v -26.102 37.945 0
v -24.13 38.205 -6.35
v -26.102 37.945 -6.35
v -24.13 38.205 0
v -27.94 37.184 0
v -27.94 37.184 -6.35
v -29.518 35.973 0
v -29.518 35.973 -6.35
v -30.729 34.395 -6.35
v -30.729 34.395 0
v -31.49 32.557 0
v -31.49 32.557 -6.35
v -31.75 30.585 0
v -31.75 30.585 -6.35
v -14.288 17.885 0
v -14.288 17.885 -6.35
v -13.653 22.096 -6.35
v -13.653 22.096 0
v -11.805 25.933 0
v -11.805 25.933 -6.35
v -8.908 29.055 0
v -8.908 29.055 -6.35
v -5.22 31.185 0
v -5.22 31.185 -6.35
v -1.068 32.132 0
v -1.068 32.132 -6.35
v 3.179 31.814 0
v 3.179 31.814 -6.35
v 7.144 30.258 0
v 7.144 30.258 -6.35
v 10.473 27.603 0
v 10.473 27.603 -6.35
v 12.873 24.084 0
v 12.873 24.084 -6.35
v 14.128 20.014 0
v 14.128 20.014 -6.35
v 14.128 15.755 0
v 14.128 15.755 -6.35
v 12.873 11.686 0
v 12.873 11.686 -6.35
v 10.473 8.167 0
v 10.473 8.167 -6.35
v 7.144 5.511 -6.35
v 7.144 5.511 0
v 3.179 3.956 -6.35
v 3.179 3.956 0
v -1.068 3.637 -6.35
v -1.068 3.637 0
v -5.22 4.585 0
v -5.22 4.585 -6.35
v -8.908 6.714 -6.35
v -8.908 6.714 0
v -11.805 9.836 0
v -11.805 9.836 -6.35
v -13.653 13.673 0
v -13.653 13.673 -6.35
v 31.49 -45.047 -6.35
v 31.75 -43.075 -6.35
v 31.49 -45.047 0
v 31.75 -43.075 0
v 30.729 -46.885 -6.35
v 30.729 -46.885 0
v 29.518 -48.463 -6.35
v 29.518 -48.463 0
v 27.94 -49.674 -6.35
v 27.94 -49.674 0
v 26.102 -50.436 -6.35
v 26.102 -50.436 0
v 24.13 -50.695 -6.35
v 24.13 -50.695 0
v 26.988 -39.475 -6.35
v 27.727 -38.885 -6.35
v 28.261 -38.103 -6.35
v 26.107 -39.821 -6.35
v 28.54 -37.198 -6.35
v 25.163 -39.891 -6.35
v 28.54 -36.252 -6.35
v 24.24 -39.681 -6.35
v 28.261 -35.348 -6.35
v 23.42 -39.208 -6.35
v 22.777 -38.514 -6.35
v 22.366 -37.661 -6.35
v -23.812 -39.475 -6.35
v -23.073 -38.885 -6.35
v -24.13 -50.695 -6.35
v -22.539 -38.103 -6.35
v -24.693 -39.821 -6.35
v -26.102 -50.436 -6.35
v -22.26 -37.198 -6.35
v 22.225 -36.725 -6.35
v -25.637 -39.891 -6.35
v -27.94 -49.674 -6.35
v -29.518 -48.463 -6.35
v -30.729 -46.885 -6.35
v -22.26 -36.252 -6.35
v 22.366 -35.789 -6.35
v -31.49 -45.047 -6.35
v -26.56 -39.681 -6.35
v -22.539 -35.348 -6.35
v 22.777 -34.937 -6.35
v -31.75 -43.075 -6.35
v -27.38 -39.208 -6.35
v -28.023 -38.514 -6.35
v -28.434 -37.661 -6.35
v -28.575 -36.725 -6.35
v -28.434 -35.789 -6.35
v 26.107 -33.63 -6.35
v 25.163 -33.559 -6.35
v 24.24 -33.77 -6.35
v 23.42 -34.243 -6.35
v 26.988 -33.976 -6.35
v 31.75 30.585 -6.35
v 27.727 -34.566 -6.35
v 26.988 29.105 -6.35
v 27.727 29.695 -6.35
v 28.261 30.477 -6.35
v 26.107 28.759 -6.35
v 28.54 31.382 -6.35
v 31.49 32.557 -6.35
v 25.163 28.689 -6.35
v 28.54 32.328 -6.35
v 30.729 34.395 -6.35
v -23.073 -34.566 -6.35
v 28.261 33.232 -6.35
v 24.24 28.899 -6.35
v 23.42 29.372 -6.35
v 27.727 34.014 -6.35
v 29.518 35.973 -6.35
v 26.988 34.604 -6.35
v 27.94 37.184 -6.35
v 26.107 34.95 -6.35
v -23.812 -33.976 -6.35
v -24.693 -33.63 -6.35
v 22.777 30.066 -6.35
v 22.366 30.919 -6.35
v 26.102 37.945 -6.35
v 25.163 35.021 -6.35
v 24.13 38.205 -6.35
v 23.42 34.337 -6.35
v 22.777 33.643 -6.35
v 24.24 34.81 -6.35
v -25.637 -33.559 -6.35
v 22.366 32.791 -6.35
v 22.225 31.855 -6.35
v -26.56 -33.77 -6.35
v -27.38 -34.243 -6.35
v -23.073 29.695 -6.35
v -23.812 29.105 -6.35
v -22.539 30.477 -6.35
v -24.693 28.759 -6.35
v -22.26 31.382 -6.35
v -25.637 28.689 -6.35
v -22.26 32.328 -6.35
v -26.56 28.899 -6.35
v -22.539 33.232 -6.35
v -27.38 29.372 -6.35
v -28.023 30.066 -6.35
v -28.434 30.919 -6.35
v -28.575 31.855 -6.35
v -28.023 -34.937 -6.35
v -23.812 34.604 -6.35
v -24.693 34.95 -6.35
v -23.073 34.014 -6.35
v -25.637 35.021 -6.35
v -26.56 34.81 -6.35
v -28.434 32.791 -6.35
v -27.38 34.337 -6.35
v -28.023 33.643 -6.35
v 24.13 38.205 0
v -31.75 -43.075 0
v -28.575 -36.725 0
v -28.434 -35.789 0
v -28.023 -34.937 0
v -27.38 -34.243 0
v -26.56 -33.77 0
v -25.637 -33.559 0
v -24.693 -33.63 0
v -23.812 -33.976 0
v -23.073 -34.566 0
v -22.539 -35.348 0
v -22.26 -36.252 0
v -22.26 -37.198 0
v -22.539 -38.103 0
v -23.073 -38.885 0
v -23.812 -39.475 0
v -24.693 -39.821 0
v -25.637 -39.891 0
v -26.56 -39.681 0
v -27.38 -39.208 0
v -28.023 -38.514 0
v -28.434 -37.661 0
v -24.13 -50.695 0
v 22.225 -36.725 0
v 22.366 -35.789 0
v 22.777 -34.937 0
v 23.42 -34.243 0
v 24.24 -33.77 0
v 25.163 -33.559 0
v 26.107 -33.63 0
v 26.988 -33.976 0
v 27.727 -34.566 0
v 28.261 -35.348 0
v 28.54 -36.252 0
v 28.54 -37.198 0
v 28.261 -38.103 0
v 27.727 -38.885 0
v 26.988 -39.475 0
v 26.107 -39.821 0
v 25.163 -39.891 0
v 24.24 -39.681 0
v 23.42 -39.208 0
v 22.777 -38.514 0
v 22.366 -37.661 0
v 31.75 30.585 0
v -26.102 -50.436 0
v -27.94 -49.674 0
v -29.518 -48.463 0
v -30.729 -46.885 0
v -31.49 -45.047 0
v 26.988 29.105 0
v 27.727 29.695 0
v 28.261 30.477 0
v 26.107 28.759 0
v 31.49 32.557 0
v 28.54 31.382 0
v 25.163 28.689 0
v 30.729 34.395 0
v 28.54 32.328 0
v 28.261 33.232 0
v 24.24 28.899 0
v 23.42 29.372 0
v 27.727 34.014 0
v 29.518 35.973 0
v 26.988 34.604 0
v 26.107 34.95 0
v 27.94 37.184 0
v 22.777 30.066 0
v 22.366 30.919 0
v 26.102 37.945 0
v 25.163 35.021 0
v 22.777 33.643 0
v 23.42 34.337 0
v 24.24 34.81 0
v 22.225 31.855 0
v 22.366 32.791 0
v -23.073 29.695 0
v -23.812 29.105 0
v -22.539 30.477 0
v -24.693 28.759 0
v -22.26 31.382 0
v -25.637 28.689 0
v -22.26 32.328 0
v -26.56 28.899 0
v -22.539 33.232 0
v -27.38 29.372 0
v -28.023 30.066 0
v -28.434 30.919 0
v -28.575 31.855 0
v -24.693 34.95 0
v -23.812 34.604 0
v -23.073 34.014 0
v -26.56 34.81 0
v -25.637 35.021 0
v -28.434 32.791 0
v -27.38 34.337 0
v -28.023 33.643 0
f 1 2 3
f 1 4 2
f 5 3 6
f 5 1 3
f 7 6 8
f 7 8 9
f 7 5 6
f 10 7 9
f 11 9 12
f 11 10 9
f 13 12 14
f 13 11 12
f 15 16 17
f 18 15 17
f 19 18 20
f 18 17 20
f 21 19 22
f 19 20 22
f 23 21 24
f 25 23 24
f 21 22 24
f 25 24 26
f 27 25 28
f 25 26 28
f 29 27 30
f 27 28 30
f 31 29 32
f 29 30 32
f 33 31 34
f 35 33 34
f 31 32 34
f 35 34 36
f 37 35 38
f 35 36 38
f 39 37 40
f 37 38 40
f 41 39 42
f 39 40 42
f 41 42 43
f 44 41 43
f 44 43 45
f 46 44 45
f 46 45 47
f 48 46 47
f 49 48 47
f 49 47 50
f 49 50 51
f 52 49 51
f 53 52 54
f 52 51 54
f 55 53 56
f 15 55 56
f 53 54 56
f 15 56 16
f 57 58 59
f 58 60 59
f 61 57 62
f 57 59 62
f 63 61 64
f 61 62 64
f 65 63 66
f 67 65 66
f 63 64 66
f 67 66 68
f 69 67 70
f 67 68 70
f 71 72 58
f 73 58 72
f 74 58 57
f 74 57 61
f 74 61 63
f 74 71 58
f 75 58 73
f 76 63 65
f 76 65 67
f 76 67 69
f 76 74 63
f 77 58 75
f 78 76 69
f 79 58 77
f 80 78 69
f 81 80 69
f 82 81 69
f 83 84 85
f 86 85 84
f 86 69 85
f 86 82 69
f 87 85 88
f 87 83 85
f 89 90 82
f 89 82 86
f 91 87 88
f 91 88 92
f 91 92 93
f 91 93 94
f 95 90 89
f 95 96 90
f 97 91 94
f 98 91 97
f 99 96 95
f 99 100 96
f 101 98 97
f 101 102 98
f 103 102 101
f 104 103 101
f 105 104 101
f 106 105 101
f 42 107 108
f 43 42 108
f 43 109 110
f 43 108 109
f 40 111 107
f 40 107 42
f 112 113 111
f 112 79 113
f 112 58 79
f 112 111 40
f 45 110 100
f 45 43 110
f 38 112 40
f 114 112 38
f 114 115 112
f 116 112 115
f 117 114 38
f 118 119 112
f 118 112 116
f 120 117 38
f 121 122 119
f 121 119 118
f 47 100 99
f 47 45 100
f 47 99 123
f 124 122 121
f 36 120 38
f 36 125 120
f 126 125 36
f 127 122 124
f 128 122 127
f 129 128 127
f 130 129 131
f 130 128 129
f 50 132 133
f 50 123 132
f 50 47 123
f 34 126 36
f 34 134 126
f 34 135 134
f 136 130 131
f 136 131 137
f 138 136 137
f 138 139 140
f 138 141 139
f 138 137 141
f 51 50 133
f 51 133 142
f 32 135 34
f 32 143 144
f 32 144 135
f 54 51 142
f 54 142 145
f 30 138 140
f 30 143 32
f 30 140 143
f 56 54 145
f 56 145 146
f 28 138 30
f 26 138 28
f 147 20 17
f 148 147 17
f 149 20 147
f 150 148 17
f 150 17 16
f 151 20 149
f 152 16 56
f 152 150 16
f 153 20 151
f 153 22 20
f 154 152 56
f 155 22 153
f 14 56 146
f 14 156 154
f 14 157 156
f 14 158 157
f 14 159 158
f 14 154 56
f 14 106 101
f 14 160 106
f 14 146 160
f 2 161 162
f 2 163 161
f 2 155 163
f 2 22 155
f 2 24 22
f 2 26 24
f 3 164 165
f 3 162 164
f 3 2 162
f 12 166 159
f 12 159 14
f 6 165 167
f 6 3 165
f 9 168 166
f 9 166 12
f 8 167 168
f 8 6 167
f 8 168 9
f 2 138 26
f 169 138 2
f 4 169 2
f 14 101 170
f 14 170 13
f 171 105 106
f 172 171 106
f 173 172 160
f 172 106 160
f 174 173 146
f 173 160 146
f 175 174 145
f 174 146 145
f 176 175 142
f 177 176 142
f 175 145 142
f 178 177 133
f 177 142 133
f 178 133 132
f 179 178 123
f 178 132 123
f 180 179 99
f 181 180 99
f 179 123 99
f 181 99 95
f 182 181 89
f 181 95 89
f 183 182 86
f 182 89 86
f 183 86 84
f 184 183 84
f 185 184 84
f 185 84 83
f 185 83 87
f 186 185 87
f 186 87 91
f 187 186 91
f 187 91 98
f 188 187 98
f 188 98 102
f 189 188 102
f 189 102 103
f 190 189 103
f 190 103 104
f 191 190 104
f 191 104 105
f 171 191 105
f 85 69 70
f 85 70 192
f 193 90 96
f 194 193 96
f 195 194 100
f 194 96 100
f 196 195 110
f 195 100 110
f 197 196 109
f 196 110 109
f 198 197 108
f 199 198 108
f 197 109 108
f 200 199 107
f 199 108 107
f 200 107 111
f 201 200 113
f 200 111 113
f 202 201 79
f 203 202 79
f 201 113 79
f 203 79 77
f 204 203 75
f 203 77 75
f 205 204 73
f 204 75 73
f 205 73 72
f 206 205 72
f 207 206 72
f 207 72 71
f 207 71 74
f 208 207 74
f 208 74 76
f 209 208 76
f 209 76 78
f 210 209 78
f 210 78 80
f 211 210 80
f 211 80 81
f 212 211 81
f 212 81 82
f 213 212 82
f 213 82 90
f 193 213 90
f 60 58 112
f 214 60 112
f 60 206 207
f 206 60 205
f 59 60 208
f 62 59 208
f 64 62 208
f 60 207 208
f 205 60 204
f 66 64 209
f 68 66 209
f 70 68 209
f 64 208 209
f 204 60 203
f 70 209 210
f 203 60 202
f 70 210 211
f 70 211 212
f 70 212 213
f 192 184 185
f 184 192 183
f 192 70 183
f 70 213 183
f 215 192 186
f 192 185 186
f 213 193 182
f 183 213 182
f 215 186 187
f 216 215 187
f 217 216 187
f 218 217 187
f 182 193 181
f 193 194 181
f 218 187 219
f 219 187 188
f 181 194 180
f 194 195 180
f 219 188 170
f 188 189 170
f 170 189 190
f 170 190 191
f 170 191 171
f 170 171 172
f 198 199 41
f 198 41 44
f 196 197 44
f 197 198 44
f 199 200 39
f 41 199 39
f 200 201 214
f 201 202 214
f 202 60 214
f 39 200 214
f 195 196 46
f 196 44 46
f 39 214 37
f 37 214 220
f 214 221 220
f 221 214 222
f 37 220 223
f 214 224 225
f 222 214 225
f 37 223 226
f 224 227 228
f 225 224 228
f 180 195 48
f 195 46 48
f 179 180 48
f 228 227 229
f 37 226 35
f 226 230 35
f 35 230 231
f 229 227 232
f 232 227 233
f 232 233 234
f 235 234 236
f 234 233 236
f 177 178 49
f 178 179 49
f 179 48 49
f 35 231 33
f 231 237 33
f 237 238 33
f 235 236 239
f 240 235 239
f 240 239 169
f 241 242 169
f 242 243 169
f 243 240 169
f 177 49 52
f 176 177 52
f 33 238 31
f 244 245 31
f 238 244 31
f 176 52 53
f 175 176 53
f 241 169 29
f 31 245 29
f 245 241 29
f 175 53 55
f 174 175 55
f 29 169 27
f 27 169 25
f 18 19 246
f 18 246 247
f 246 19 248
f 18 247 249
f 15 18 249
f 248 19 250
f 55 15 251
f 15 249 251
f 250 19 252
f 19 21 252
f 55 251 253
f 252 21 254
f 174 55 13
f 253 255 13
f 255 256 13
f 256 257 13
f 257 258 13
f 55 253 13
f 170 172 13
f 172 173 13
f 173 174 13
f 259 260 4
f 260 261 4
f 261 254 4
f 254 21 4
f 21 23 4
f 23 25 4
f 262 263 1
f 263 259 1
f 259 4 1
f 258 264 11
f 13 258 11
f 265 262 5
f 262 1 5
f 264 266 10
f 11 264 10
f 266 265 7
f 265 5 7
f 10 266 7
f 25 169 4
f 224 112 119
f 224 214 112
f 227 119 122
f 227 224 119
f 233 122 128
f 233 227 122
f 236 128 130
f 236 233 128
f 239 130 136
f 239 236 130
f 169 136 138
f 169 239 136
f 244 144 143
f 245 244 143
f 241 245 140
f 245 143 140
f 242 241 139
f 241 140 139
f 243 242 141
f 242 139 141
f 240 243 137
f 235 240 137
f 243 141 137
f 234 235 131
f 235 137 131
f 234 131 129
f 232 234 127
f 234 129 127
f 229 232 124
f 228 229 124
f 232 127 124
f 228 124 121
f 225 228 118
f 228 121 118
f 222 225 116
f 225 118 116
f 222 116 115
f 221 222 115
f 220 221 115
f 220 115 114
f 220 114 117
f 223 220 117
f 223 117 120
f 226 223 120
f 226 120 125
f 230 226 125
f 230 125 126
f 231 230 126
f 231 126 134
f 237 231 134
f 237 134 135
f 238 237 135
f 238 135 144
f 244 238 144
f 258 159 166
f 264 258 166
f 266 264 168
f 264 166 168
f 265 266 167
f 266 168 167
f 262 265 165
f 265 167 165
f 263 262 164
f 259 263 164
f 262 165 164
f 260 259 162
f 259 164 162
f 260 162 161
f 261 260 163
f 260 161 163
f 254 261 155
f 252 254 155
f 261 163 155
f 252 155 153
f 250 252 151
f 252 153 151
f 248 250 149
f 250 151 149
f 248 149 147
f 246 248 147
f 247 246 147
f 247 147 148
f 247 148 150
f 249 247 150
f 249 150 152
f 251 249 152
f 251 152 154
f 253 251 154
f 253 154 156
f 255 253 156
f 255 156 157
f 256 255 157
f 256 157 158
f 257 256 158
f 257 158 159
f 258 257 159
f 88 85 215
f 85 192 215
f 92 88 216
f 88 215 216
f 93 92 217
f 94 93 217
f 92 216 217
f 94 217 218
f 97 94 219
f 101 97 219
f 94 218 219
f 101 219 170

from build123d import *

# Parameters (mm, degrees)
BOSS_EXTRUDE1_DEPTH = 6.35
SKETCH2_R           = 1.35
SKETCH2_R_2         = 1.385
CUT_EXTRUDE1_DEPTH  = 38.116505762
SKETCH3_W           = 63.5
SKETCH3_H           = 88.9
SKETCH3_W_2         = 38.321076004
SKETCH3_H_2         = 47.237540142
BOSS_EXTRUDE2_DEPTH = 6.35
SKETCH5_W           = 27.94
SKETCH5_H           = 55.88
CUT_EXTRUDE3_DEPTH  = 61.153053743
SKETCH6_R           = 3.175
CUT_EXTRUDE4_DEPTH  = 61.153053743
FILLET2_R           = 7.62
SKETCH7_W           = 41.724968974
SKETCH7_H           = 57.858351452
BOSS_EXTRUDE3_DEPTH = 6.35
SKETCH8_R           = 14.2875
CUT_EXTRUDE5_DEPTH  = 6.35


with BuildPart() as part:
    # Sketch1 → Boss-Extrude1 (new body)
    with BuildSketch(Plane.XY):
        with BuildLine():
            Line((-19.69889026, 23.2987845), (-14.850045261, 29.75147823))
            ThreePointArc((-14.850045261, 29.75147823), (-14.144755454, 30.339267512), (-13.251155001, 30.55))
            Line((-13.251155001, 30.55), (13.251155001, 30.55))
            ThreePointArc((13.251155001, 30.55), (14.144755454, 30.339267512), (14.850045261, 29.75147823))
            Line((14.850045261, 29.75147823), (19.69889026, 23.2987845))
            ThreePointArc((19.69889026, 23.2987845), (19.997074131, 22.730638521), (20.1, 22.09730627))
            Line((20.1, 22.09730627), (20.1, -22.09730627))
            ThreePointArc((20.1, -22.09730627), (19.997074131, -22.730638521), (19.69889026, -23.2987845))
            Line((19.69889026, -23.2987845), (14.850045261, -29.75147823))
            ThreePointArc((14.850045261, -29.75147823), (14.144755454, -30.339267512), (13.251155001, -30.55))
            Line((13.251155001, -30.55), (-13.251155001, -30.55))
            ThreePointArc((-13.251155001, -30.55), (-14.144755454, -30.339267512), (-14.850045261, -29.75147823))
            Line((-14.850045261, -29.75147823), (-19.69889026, -23.2987845))
            ThreePointArc((-19.69889026, -23.2987845), (-19.997074131, -22.730638521), (-20.1, -22.09730627))
            Line((-20.1, -22.09730627), (-20.1, 22.09730627))
            ThreePointArc((-20.1, 22.09730627), (-19.997074131, 22.730638521), (-19.69889026, 23.2987845))
        make_face()
    extrude(amount=-BOSS_EXTRUDE1_DEPTH)

    # Sketch2 → Cut-Extrude1 (cut, through all)
    with BuildSketch(Plane(origin=(0, 0, -6.35), x_dir=(-1, 0, 0), z_dir=(0, 0, -1))):
        with Locations((17.3, 21.9487845)):
            Circle(SKETCH2_R)
        with Locations((17.3, -0.0512155)):
            Circle(SKETCH2_R)
        with Locations((17.3, -22.0512155)):
            Circle(SKETCH2_R)
        with Locations((11, -27.75)):
            Circle(SKETCH2_R_2)
        with Locations(Location((-11, -27.75, 0), (0, 0, 180))):
            Circle(SKETCH2_R_2)
        with Locations(Location((-17.3, -22.0512155, 0), (0, 0, 180))):
            Circle(SKETCH2_R)
        with Locations(Location((-17.3, -0.0512155, 0), (0, 0, 180))):
            Circle(SKETCH2_R)
        with Locations(Location((-17.3, 21.9487845, 0), (0, 0, 180))):
            Circle(SKETCH2_R)
    extrude(amount=-CUT_EXTRUDE1_DEPTH, mode=Mode.SUBTRACT)

    # Sketch3 → Boss-Extrude2 (add)
    with BuildSketch(Plane(origin=(0, 0, -6.35), x_dir=(-1, 0, 0), z_dir=(0, 0, -1))):
        with Locations((0, -6.2452155)):
            Rectangle(SKETCH3_W, SKETCH3_H)
        Rectangle(SKETCH3_W_2, SKETCH3_H_2, mode=Mode.SUBTRACT)
    extrude(amount=-BOSS_EXTRUDE2_DEPTH)

    # Sketch5 → Cut-Extrude3 (cut, through all)
    with BuildSketch(Plane.XY):
        with Locations((0, 3.0087845)):
            Rectangle(SKETCH5_W, SKETCH5_H)
    extrude(amount=-CUT_EXTRUDE3_DEPTH, mode=Mode.SUBTRACT)

    # Sketch6 → Cut-Extrude4 (cut, through all)
    with BuildSketch(Plane(origin=(0, 0, -6.35), x_dir=(-1, 0, 0), z_dir=(0, 0, -1))):
        with Locations((25.4, 31.8547845)):
            Circle(SKETCH6_R)
        with Locations((-25.4, 31.8547845)):
            Circle(SKETCH6_R)
        with Locations((-25.4, -36.7252155)):
            Circle(SKETCH6_R)
        with Locations((25.4, -36.7252155)):
            Circle(SKETCH6_R)
    extrude(amount=-CUT_EXTRUDE4_DEPTH, mode=Mode.SUBTRACT)

    # Fillet2
    fillet2_edges = [part.edges().sort_by_distance(p)[0] for p in [
        (-31.75, 38.2047845, -3.175),
        (-31.75, -50.6952155, -3.175),
        (31.75, -50.6952155, -3.175),
        (31.75, 38.2047845, -3.175),
    ]]
    fillet(fillet2_edges, radius=FILLET2_R)

    # Sketch7 → Boss-Extrude3 (add)
    with BuildSketch(Plane(origin=(0, 0, -6.35), x_dir=(-1, 0, 0), z_dir=(0, 0, -1))):
        with Locations((0, 3.16744248)):
            Rectangle(SKETCH7_W, SKETCH7_H)
    extrude(amount=-BOSS_EXTRUDE3_DEPTH)

    # Sketch8 → Cut-Extrude5 (cut)
    with BuildSketch(Plane(origin=(0, 0, -6.35), x_dir=(-1, 0, 0), z_dir=(0, 0, -1))):
        with Locations((0, 17.8847845)):
            Circle(SKETCH8_R)
    extrude(amount=-CUT_EXTRUDE5_DEPTH, mode=Mode.SUBTRACT)


solid = part.part
